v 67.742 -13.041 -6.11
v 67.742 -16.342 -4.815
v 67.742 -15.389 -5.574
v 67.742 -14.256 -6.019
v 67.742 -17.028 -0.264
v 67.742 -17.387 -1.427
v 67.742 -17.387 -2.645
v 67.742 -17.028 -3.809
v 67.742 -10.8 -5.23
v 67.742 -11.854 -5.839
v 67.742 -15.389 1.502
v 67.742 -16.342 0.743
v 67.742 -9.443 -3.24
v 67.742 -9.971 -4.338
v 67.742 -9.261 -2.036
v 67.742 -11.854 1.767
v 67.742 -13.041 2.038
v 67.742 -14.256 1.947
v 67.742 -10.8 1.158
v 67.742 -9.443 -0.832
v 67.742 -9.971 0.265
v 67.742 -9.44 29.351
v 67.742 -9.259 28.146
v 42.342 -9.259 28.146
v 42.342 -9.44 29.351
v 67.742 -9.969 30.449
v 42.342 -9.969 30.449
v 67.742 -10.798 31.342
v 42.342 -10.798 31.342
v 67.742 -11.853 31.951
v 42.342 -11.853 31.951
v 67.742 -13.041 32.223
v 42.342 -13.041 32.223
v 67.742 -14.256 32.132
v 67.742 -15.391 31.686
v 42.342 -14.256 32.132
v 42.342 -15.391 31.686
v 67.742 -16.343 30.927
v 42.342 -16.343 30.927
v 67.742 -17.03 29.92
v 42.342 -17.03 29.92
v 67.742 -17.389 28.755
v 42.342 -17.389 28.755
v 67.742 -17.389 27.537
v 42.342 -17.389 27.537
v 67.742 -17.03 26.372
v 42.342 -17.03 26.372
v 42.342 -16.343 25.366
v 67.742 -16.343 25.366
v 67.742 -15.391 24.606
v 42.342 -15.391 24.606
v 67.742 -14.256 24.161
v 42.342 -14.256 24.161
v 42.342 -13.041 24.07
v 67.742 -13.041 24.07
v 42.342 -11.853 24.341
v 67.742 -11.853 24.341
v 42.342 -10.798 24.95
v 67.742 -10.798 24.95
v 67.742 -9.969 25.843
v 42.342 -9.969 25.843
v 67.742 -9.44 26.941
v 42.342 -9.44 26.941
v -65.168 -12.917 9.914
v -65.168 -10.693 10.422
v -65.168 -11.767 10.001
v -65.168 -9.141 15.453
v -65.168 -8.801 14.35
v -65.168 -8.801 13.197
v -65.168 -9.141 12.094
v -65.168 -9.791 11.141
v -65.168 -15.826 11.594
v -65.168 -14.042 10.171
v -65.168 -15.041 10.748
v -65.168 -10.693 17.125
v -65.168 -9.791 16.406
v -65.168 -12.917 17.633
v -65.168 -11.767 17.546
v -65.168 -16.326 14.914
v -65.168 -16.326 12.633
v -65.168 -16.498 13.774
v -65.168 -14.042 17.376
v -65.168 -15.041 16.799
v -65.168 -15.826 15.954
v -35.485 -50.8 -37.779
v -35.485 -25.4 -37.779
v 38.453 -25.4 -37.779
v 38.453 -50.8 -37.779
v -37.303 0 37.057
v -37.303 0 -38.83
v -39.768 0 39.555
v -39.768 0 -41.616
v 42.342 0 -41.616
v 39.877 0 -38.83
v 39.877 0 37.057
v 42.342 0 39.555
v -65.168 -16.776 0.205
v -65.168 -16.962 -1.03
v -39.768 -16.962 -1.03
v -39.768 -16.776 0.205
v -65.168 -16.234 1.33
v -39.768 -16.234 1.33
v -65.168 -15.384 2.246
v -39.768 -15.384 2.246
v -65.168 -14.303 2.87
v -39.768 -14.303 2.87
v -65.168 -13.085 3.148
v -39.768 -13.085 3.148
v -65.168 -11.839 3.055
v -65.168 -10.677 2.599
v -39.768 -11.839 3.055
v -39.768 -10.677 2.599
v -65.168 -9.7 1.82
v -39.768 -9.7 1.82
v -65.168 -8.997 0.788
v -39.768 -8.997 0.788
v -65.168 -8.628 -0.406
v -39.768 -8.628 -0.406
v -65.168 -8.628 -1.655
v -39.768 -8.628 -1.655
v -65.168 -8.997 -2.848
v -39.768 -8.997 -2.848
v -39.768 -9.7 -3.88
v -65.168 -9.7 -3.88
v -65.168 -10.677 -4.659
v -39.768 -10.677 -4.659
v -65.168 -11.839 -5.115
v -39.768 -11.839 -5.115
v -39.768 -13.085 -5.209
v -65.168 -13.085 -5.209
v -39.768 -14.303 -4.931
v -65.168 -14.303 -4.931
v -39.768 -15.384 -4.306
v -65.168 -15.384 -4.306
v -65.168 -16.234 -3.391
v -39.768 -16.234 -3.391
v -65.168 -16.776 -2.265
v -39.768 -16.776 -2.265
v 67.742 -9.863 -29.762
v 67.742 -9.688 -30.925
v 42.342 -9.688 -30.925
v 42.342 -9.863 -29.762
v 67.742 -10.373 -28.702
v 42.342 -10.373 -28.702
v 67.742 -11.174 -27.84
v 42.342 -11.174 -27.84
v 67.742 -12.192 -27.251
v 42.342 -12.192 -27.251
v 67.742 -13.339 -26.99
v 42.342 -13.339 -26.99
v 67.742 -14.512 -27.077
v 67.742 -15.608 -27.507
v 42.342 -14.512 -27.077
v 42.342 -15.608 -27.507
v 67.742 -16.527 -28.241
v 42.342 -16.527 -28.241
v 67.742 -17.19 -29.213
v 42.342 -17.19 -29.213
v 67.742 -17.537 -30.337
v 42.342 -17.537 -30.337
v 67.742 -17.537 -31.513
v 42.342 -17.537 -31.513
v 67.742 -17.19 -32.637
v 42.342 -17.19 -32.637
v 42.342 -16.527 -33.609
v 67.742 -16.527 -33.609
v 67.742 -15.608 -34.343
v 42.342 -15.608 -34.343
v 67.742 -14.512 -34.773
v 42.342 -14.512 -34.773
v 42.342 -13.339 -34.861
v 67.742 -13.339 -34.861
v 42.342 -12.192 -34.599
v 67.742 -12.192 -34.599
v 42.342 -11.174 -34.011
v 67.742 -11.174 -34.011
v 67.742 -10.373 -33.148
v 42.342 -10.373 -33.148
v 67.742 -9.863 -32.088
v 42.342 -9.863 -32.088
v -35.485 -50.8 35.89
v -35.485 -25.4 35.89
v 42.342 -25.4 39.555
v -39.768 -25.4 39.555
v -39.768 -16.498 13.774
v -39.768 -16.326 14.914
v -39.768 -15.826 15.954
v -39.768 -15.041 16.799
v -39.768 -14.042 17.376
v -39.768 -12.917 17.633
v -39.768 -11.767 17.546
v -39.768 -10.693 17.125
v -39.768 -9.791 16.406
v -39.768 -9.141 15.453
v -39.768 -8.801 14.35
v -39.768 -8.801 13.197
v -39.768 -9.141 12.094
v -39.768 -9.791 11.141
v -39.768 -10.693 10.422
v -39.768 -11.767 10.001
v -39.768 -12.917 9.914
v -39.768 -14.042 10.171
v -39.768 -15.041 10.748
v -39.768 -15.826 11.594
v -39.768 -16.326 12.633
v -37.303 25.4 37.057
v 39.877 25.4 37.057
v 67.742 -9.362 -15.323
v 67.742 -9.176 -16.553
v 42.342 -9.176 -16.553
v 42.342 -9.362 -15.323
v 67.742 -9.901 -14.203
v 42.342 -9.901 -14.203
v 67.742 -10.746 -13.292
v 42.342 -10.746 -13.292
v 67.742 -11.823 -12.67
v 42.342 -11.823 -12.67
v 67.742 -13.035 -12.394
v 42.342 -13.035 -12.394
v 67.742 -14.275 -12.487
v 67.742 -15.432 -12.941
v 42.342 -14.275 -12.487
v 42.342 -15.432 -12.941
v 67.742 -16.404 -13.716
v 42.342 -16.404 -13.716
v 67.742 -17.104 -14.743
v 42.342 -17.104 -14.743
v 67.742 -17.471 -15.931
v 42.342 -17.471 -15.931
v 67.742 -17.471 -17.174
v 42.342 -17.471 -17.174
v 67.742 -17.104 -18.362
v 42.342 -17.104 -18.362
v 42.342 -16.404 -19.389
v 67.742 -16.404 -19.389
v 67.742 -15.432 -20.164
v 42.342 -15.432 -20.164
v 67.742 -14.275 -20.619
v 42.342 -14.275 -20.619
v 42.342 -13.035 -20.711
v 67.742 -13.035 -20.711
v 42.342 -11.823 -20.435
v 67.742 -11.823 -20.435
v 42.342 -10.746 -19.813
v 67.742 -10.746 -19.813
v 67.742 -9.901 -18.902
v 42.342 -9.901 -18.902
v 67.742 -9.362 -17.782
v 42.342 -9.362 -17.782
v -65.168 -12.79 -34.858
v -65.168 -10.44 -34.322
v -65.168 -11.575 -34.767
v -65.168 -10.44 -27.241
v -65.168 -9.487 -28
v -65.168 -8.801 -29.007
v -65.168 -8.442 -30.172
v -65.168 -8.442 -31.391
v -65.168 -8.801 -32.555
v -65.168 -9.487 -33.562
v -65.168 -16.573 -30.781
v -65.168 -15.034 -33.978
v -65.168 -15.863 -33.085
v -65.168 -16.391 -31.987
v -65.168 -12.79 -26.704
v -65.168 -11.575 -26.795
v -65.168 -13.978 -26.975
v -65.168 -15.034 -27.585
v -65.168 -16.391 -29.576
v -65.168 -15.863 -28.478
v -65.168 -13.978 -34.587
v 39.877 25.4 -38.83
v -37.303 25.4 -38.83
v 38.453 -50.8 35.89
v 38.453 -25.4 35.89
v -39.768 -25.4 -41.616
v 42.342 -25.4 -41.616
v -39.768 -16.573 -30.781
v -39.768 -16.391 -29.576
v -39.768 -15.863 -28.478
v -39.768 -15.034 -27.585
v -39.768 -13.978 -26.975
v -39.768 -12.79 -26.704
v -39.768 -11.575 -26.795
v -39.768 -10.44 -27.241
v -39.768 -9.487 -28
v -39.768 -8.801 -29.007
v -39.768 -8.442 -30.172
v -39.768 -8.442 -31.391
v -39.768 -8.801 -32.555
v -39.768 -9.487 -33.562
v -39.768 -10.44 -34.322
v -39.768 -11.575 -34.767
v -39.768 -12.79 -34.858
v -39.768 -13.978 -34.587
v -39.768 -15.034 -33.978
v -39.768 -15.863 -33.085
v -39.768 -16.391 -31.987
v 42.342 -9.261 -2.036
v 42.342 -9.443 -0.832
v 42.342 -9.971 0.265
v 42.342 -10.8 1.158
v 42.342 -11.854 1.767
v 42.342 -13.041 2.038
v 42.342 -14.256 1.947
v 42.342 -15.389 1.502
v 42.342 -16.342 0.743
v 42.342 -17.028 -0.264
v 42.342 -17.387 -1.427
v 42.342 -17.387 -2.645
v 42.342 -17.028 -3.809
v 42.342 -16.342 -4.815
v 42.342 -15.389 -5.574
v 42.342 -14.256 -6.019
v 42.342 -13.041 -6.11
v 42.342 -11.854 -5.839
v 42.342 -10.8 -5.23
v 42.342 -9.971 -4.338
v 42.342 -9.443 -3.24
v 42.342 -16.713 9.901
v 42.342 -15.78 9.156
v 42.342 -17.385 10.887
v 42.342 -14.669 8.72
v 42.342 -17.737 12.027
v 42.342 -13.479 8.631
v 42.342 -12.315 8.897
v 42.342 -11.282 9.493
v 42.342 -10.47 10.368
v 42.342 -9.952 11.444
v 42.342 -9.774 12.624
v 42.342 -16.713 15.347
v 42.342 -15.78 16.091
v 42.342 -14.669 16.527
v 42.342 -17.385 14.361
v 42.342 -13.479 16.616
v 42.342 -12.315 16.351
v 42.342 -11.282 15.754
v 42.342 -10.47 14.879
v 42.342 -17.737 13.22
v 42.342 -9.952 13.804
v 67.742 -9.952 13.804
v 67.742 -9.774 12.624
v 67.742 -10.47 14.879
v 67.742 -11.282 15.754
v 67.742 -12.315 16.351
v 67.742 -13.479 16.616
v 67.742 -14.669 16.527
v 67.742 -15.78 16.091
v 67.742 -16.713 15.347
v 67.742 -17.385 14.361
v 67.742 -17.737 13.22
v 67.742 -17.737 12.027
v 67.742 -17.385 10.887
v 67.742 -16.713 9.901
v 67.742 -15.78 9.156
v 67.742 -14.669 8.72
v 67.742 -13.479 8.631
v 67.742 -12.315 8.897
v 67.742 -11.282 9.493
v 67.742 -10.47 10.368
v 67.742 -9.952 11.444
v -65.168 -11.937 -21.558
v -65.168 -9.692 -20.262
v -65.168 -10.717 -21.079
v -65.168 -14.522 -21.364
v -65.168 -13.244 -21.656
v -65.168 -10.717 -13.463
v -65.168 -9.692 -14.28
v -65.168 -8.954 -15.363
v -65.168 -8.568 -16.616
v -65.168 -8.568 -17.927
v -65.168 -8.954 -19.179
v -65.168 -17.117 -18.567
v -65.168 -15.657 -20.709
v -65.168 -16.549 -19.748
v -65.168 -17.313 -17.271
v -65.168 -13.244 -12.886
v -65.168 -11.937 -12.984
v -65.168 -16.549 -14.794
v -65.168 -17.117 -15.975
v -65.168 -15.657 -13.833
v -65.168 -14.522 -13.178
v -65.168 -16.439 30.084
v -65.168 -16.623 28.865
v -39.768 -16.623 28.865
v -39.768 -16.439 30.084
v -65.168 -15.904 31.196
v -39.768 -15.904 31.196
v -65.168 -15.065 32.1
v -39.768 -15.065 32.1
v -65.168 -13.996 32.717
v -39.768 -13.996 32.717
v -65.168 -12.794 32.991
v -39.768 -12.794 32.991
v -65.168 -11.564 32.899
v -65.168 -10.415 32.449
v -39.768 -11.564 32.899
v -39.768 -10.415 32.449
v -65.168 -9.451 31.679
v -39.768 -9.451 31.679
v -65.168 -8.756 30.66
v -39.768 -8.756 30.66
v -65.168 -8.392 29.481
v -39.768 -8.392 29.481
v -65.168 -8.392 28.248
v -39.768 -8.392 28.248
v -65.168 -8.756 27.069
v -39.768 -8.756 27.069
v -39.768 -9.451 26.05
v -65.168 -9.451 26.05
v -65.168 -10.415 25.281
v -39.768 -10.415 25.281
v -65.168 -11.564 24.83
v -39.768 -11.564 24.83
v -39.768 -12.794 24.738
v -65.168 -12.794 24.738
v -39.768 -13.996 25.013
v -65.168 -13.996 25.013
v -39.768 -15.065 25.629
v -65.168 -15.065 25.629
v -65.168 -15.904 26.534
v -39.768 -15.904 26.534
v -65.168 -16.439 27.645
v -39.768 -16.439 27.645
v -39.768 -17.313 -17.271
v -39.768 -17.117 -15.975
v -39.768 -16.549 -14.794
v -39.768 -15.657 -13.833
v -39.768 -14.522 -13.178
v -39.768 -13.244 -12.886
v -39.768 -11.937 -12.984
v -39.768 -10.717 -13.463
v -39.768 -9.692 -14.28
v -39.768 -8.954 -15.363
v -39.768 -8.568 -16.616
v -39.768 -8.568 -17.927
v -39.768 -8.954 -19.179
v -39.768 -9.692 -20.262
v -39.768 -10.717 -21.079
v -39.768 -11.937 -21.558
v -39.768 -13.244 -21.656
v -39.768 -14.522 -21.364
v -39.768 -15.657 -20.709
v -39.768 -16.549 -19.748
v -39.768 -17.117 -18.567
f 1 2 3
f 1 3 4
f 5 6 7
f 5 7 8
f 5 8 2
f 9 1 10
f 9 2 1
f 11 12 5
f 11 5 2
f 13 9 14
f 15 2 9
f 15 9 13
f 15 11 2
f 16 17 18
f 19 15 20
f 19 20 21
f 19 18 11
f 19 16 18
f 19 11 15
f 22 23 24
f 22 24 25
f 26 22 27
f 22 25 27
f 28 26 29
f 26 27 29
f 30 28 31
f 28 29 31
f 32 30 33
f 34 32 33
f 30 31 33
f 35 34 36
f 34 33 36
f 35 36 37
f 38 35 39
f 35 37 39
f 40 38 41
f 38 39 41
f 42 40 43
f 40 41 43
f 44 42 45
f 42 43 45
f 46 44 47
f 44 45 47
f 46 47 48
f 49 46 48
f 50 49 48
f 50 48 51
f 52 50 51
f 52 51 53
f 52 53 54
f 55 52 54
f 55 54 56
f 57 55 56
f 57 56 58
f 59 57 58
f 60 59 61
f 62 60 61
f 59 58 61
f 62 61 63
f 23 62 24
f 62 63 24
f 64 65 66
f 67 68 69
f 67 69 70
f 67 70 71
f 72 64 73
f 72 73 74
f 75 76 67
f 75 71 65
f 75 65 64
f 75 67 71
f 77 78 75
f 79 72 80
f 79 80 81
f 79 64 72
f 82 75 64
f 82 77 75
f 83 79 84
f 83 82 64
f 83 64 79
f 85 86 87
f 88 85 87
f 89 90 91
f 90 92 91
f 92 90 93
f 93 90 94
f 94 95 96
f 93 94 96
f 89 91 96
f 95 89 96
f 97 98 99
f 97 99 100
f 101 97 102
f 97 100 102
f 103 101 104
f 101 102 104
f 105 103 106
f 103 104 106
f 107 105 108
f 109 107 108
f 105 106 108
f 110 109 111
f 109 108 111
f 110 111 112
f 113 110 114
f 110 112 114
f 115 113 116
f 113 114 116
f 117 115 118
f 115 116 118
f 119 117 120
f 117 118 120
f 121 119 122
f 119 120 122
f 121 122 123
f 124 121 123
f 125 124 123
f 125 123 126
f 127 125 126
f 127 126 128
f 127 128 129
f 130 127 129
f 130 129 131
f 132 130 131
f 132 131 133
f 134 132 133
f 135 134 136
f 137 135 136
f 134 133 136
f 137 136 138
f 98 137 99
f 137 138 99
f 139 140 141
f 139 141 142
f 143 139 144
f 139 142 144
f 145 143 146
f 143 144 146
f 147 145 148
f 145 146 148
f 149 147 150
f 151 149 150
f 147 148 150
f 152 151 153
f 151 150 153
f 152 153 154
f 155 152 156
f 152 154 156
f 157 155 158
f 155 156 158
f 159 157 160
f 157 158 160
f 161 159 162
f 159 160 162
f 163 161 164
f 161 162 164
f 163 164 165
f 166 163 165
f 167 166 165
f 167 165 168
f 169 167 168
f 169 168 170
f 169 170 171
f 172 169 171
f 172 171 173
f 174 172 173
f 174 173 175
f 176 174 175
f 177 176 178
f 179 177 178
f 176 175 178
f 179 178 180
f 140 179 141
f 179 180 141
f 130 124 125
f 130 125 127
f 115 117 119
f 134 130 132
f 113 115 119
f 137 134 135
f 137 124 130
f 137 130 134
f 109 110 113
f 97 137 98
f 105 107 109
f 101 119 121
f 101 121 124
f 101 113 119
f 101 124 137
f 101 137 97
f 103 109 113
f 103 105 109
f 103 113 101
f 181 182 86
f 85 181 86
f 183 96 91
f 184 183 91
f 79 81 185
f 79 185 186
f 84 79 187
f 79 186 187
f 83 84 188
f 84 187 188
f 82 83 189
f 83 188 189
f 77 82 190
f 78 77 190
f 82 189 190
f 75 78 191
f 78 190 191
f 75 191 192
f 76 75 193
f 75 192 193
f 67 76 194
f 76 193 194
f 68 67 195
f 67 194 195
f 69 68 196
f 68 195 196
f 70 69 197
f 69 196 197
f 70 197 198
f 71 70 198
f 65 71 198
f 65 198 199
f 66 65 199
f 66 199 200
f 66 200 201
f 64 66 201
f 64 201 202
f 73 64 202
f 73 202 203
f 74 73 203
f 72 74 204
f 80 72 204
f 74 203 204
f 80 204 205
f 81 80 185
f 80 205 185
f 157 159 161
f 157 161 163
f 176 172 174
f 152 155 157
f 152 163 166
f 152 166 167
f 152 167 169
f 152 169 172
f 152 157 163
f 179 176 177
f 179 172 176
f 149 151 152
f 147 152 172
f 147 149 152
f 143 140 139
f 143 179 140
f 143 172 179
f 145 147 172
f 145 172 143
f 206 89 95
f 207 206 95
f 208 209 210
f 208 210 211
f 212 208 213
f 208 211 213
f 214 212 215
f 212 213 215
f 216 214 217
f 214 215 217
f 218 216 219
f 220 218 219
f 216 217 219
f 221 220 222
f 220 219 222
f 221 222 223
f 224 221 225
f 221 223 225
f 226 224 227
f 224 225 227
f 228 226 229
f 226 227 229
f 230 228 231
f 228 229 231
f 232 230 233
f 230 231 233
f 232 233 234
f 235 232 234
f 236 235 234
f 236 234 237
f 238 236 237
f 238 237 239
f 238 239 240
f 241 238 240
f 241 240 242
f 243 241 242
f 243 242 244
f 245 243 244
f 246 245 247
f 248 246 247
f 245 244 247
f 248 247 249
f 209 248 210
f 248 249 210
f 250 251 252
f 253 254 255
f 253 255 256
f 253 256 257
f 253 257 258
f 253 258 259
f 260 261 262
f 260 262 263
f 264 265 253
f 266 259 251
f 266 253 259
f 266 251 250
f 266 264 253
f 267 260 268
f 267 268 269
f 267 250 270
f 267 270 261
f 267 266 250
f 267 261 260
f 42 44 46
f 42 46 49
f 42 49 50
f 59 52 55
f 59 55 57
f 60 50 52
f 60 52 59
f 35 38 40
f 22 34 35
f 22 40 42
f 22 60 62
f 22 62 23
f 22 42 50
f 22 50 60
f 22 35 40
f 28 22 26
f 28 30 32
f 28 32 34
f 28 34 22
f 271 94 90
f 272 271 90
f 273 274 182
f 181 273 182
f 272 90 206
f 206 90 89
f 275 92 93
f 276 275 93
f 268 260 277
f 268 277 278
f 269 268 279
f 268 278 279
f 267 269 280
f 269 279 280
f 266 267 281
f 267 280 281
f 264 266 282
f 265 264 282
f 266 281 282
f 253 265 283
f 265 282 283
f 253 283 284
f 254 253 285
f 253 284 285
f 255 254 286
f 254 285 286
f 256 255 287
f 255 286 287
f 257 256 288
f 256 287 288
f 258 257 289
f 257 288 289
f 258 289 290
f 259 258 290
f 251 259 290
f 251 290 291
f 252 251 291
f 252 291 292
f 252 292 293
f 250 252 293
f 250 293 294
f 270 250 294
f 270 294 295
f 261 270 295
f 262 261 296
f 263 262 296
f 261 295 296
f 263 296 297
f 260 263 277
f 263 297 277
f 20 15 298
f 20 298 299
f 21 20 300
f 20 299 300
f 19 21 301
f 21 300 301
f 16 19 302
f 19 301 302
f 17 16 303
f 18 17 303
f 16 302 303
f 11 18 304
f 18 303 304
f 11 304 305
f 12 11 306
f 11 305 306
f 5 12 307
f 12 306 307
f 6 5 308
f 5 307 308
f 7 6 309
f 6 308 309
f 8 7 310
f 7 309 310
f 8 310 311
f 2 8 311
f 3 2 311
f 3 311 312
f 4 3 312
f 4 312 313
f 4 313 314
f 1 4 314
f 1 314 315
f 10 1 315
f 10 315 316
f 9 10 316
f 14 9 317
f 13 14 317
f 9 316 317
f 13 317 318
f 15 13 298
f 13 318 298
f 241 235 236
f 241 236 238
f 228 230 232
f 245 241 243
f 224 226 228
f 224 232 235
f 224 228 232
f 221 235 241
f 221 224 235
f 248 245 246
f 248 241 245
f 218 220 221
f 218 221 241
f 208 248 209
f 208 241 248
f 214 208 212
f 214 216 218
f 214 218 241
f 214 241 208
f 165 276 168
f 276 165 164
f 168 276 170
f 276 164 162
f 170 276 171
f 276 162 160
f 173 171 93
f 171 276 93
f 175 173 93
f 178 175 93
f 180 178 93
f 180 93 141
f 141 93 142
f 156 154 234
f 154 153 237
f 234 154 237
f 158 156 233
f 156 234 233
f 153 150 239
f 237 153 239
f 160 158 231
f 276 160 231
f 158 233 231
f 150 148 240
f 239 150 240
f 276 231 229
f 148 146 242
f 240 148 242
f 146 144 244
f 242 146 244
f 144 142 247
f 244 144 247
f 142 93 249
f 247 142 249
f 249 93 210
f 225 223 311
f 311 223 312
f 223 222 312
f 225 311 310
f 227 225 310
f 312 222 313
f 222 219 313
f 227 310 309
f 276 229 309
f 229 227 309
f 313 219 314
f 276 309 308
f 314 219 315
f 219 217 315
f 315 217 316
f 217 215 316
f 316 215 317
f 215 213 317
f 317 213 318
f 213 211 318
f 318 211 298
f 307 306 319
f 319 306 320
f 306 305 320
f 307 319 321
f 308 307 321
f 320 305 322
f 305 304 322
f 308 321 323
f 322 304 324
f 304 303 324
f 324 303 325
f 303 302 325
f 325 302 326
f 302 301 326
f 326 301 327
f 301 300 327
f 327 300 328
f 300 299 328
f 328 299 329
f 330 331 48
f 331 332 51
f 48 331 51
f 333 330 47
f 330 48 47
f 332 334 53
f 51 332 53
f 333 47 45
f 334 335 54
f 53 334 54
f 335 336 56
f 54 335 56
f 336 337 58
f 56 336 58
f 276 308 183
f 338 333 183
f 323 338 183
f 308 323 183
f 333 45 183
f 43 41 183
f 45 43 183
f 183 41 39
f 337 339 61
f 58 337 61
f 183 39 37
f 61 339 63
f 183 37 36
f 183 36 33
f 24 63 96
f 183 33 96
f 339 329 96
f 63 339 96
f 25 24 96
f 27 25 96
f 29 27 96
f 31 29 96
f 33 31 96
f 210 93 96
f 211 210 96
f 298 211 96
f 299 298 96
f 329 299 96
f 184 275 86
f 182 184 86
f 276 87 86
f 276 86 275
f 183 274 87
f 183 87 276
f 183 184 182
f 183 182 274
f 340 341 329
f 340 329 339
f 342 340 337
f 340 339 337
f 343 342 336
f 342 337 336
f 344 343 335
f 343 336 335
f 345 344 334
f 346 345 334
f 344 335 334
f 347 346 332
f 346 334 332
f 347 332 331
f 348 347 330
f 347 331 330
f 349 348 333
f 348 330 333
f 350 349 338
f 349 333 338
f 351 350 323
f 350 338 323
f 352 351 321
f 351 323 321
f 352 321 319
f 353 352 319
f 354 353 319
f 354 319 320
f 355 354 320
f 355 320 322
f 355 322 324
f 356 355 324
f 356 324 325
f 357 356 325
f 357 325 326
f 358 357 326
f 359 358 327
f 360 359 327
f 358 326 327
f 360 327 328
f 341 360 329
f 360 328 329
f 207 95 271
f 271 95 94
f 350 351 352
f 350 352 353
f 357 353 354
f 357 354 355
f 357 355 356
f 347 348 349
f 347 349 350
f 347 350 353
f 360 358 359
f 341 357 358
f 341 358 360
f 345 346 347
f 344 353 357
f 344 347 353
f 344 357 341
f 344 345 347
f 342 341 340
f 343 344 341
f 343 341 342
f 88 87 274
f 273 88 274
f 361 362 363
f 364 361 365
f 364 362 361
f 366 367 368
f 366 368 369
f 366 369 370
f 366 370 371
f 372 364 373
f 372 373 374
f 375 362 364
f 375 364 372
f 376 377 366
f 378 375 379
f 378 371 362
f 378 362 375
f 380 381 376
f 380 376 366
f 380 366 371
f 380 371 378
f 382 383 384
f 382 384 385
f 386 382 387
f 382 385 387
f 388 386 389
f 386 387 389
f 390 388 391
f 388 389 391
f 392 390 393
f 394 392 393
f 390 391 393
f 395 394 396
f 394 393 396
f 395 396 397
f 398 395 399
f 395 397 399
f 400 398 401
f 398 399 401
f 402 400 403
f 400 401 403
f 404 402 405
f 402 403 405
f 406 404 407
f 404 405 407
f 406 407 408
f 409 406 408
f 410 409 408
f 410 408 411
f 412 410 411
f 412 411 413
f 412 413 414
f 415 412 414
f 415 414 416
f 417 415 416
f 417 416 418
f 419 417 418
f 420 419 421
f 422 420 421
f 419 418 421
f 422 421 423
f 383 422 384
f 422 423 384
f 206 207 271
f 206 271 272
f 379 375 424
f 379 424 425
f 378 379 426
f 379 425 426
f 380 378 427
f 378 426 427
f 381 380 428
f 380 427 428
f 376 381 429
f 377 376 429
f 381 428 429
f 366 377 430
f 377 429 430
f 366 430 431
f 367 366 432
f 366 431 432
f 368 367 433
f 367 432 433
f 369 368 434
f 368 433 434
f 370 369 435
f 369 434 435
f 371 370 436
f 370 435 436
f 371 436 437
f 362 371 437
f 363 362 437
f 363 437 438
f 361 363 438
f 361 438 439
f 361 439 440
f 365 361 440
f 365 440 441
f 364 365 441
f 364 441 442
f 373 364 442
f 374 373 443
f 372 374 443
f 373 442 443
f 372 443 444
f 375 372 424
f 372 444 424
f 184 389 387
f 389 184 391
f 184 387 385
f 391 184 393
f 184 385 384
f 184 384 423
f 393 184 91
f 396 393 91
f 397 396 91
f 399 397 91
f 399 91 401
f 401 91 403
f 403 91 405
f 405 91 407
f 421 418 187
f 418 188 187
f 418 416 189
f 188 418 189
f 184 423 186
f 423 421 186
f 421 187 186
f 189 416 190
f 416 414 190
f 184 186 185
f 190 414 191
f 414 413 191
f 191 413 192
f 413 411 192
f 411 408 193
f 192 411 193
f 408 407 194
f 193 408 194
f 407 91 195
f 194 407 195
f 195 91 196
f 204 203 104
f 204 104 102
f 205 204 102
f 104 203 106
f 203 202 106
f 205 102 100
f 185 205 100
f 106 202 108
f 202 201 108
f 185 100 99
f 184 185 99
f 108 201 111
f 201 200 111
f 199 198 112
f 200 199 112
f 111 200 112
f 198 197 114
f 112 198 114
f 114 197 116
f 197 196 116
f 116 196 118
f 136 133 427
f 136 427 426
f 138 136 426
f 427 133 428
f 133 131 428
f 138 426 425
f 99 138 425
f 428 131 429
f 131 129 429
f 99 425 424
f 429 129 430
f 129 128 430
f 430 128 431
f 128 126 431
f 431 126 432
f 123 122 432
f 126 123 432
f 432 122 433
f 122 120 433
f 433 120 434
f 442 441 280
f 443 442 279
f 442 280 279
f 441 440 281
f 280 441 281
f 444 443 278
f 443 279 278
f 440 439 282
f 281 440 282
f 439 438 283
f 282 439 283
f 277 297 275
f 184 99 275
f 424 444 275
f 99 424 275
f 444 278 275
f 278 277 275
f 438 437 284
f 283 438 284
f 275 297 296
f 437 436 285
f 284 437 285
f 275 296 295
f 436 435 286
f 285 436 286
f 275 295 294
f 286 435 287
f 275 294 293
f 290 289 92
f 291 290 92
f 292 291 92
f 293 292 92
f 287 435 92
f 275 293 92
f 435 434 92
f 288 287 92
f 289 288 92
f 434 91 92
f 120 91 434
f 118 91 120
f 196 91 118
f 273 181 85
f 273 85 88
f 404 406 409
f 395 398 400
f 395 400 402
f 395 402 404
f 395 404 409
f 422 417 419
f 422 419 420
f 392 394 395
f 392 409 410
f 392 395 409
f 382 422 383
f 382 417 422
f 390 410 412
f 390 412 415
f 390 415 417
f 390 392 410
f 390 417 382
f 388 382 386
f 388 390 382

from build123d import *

# Parameters (mm, degrees)
F0_W     = 42.3415824771
F0_H     = 39.5551770926
F0_W_2   = 39.7675335407
F0_H_2   = 41.6155532002
F1_DEPTH = 25.4
F2_W     = 35.4850441217
F2_H     = 35.8898155391
F2_W_2   = 38.453374058
F2_H_2   = 37.7787537873
F3_DEPTH = 25.4
F4_W     = 39.8773439229
F4_H     = 37.0570905507
F4_W_2   = 37.3032912612
F4_H_2   = 38.8300158083
F5_DEPTH = 25.4
F6_R     = 4.0879753591
F6_R_2   = 4.0037311952
F6_R_3   = 4.0854495617
F6_R_4   = 4.1705192674
F6_R_5   = 3.9465691335
F7_DEPTH = 25.4
F8_R     = 4.138200079
F8_R_2   = 3.8699291695
F8_R_3   = 4.1902853873
F8_R_4   = 4.3971579596
F8_R_5   = 4.0885433944
F9_DEPTH = 25.4


with BuildPart() as f1:
    # F0 (on Front) → F1 (new body)
    with BuildSketch(Plane.XZ):
        with Locations((21.1707912385, 19.7775885463)):
            Rectangle(F0_W, F0_H)
        with Locations((-19.8837667704, -20.8077766001)):
            Rectangle(F0_W_2, F0_H_2)
        with Locations((21.1707912385, -20.8077766001)):
            Rectangle(F0_W, F0_H_2)
        with Locations((-19.8837667704, 19.7775885463)):
            Rectangle(F0_W_2, F0_H)
    extrude(amount=F1_DEPTH)

    # F2 (on face) → F3 (join)
    with BuildSketch(Plane.XZ.offset(25.4)):
        with Locations((-17.7425220609, 17.9449077696)):
            Rectangle(F2_W, F2_H)
        with Locations((19.226687029, 17.9449077696)):
            Rectangle(F2_W_2, F2_H)
        with Locations((-17.7425220609, -18.8893768936)):
            Rectangle(F2_W, F2_H_2)
        with Locations((19.226687029, -18.8893768936)):
            Rectangle(F2_W_2, F2_H_2)
    extrude(amount=F3_DEPTH)

    # F4 (on face) → F5 (join)
    with BuildSketch(Plane(origin=(0, 0, 0), x_dir=(-1, 0, 0), z_dir=(0, 1, 0))):
        with Locations((-19.9386719614, 18.5285452753)):
            Rectangle(F4_W, F4_H)
        with Locations((18.6516456306, 18.5285452753)):
            Rectangle(F4_W_2, F4_H)
        with Locations((18.6516456306, -19.4150079042)):
            Rectangle(F4_W_2, F4_H_2)
        with Locations((-19.9386719614, -19.4150079042)):
            Rectangle(F4_W, F4_H_2)
    extrude(amount=F5_DEPTH)

    # F6 (on face) → F7 (join)
    with BuildSketch(Plane.YZ.offset(42.3415824771)):
        with Locations((-13.346764259, 28.1461030245)):
            Circle(F6_R)
        with Locations((-13.7779414654, 12.6237412915)):
            Circle(F6_R_2)
        with Locations((-13.346764259, -2.0362669602)):
            Circle(F6_R_3)
        with Locations((-13.346764259, -16.5525507182)):
            Circle(F6_R_4)
        with Locations((-13.6342160404, -30.9251081198)):
            Circle(F6_R_5)
    extrude(amount=F7_DEPTH)

    # F8 (on face) → F9 (join)
    with BuildSketch(Plane(origin=(-39.7675335407, 0, 0), x_dir=(0, -1, 0), z_dir=(-1, 0, 0))):
        with Locations((12.4844107777, 28.8647320122)):
            Circle(F8_R)
        with Locations((12.6281362027, 13.7735465541)):
            Circle(F8_R_2)
        with Locations((12.771862559, -1.0301880538)):
            Circle(F8_R_3)
        with Locations((12.915587984, -17.2711778432)):
            Circle(F8_R_4)
        with Locations((12.4844107777, -30.7813826948)):
            Circle(F8_R_5)
    extrude(amount=F9_DEPTH)


solid = f1.part
